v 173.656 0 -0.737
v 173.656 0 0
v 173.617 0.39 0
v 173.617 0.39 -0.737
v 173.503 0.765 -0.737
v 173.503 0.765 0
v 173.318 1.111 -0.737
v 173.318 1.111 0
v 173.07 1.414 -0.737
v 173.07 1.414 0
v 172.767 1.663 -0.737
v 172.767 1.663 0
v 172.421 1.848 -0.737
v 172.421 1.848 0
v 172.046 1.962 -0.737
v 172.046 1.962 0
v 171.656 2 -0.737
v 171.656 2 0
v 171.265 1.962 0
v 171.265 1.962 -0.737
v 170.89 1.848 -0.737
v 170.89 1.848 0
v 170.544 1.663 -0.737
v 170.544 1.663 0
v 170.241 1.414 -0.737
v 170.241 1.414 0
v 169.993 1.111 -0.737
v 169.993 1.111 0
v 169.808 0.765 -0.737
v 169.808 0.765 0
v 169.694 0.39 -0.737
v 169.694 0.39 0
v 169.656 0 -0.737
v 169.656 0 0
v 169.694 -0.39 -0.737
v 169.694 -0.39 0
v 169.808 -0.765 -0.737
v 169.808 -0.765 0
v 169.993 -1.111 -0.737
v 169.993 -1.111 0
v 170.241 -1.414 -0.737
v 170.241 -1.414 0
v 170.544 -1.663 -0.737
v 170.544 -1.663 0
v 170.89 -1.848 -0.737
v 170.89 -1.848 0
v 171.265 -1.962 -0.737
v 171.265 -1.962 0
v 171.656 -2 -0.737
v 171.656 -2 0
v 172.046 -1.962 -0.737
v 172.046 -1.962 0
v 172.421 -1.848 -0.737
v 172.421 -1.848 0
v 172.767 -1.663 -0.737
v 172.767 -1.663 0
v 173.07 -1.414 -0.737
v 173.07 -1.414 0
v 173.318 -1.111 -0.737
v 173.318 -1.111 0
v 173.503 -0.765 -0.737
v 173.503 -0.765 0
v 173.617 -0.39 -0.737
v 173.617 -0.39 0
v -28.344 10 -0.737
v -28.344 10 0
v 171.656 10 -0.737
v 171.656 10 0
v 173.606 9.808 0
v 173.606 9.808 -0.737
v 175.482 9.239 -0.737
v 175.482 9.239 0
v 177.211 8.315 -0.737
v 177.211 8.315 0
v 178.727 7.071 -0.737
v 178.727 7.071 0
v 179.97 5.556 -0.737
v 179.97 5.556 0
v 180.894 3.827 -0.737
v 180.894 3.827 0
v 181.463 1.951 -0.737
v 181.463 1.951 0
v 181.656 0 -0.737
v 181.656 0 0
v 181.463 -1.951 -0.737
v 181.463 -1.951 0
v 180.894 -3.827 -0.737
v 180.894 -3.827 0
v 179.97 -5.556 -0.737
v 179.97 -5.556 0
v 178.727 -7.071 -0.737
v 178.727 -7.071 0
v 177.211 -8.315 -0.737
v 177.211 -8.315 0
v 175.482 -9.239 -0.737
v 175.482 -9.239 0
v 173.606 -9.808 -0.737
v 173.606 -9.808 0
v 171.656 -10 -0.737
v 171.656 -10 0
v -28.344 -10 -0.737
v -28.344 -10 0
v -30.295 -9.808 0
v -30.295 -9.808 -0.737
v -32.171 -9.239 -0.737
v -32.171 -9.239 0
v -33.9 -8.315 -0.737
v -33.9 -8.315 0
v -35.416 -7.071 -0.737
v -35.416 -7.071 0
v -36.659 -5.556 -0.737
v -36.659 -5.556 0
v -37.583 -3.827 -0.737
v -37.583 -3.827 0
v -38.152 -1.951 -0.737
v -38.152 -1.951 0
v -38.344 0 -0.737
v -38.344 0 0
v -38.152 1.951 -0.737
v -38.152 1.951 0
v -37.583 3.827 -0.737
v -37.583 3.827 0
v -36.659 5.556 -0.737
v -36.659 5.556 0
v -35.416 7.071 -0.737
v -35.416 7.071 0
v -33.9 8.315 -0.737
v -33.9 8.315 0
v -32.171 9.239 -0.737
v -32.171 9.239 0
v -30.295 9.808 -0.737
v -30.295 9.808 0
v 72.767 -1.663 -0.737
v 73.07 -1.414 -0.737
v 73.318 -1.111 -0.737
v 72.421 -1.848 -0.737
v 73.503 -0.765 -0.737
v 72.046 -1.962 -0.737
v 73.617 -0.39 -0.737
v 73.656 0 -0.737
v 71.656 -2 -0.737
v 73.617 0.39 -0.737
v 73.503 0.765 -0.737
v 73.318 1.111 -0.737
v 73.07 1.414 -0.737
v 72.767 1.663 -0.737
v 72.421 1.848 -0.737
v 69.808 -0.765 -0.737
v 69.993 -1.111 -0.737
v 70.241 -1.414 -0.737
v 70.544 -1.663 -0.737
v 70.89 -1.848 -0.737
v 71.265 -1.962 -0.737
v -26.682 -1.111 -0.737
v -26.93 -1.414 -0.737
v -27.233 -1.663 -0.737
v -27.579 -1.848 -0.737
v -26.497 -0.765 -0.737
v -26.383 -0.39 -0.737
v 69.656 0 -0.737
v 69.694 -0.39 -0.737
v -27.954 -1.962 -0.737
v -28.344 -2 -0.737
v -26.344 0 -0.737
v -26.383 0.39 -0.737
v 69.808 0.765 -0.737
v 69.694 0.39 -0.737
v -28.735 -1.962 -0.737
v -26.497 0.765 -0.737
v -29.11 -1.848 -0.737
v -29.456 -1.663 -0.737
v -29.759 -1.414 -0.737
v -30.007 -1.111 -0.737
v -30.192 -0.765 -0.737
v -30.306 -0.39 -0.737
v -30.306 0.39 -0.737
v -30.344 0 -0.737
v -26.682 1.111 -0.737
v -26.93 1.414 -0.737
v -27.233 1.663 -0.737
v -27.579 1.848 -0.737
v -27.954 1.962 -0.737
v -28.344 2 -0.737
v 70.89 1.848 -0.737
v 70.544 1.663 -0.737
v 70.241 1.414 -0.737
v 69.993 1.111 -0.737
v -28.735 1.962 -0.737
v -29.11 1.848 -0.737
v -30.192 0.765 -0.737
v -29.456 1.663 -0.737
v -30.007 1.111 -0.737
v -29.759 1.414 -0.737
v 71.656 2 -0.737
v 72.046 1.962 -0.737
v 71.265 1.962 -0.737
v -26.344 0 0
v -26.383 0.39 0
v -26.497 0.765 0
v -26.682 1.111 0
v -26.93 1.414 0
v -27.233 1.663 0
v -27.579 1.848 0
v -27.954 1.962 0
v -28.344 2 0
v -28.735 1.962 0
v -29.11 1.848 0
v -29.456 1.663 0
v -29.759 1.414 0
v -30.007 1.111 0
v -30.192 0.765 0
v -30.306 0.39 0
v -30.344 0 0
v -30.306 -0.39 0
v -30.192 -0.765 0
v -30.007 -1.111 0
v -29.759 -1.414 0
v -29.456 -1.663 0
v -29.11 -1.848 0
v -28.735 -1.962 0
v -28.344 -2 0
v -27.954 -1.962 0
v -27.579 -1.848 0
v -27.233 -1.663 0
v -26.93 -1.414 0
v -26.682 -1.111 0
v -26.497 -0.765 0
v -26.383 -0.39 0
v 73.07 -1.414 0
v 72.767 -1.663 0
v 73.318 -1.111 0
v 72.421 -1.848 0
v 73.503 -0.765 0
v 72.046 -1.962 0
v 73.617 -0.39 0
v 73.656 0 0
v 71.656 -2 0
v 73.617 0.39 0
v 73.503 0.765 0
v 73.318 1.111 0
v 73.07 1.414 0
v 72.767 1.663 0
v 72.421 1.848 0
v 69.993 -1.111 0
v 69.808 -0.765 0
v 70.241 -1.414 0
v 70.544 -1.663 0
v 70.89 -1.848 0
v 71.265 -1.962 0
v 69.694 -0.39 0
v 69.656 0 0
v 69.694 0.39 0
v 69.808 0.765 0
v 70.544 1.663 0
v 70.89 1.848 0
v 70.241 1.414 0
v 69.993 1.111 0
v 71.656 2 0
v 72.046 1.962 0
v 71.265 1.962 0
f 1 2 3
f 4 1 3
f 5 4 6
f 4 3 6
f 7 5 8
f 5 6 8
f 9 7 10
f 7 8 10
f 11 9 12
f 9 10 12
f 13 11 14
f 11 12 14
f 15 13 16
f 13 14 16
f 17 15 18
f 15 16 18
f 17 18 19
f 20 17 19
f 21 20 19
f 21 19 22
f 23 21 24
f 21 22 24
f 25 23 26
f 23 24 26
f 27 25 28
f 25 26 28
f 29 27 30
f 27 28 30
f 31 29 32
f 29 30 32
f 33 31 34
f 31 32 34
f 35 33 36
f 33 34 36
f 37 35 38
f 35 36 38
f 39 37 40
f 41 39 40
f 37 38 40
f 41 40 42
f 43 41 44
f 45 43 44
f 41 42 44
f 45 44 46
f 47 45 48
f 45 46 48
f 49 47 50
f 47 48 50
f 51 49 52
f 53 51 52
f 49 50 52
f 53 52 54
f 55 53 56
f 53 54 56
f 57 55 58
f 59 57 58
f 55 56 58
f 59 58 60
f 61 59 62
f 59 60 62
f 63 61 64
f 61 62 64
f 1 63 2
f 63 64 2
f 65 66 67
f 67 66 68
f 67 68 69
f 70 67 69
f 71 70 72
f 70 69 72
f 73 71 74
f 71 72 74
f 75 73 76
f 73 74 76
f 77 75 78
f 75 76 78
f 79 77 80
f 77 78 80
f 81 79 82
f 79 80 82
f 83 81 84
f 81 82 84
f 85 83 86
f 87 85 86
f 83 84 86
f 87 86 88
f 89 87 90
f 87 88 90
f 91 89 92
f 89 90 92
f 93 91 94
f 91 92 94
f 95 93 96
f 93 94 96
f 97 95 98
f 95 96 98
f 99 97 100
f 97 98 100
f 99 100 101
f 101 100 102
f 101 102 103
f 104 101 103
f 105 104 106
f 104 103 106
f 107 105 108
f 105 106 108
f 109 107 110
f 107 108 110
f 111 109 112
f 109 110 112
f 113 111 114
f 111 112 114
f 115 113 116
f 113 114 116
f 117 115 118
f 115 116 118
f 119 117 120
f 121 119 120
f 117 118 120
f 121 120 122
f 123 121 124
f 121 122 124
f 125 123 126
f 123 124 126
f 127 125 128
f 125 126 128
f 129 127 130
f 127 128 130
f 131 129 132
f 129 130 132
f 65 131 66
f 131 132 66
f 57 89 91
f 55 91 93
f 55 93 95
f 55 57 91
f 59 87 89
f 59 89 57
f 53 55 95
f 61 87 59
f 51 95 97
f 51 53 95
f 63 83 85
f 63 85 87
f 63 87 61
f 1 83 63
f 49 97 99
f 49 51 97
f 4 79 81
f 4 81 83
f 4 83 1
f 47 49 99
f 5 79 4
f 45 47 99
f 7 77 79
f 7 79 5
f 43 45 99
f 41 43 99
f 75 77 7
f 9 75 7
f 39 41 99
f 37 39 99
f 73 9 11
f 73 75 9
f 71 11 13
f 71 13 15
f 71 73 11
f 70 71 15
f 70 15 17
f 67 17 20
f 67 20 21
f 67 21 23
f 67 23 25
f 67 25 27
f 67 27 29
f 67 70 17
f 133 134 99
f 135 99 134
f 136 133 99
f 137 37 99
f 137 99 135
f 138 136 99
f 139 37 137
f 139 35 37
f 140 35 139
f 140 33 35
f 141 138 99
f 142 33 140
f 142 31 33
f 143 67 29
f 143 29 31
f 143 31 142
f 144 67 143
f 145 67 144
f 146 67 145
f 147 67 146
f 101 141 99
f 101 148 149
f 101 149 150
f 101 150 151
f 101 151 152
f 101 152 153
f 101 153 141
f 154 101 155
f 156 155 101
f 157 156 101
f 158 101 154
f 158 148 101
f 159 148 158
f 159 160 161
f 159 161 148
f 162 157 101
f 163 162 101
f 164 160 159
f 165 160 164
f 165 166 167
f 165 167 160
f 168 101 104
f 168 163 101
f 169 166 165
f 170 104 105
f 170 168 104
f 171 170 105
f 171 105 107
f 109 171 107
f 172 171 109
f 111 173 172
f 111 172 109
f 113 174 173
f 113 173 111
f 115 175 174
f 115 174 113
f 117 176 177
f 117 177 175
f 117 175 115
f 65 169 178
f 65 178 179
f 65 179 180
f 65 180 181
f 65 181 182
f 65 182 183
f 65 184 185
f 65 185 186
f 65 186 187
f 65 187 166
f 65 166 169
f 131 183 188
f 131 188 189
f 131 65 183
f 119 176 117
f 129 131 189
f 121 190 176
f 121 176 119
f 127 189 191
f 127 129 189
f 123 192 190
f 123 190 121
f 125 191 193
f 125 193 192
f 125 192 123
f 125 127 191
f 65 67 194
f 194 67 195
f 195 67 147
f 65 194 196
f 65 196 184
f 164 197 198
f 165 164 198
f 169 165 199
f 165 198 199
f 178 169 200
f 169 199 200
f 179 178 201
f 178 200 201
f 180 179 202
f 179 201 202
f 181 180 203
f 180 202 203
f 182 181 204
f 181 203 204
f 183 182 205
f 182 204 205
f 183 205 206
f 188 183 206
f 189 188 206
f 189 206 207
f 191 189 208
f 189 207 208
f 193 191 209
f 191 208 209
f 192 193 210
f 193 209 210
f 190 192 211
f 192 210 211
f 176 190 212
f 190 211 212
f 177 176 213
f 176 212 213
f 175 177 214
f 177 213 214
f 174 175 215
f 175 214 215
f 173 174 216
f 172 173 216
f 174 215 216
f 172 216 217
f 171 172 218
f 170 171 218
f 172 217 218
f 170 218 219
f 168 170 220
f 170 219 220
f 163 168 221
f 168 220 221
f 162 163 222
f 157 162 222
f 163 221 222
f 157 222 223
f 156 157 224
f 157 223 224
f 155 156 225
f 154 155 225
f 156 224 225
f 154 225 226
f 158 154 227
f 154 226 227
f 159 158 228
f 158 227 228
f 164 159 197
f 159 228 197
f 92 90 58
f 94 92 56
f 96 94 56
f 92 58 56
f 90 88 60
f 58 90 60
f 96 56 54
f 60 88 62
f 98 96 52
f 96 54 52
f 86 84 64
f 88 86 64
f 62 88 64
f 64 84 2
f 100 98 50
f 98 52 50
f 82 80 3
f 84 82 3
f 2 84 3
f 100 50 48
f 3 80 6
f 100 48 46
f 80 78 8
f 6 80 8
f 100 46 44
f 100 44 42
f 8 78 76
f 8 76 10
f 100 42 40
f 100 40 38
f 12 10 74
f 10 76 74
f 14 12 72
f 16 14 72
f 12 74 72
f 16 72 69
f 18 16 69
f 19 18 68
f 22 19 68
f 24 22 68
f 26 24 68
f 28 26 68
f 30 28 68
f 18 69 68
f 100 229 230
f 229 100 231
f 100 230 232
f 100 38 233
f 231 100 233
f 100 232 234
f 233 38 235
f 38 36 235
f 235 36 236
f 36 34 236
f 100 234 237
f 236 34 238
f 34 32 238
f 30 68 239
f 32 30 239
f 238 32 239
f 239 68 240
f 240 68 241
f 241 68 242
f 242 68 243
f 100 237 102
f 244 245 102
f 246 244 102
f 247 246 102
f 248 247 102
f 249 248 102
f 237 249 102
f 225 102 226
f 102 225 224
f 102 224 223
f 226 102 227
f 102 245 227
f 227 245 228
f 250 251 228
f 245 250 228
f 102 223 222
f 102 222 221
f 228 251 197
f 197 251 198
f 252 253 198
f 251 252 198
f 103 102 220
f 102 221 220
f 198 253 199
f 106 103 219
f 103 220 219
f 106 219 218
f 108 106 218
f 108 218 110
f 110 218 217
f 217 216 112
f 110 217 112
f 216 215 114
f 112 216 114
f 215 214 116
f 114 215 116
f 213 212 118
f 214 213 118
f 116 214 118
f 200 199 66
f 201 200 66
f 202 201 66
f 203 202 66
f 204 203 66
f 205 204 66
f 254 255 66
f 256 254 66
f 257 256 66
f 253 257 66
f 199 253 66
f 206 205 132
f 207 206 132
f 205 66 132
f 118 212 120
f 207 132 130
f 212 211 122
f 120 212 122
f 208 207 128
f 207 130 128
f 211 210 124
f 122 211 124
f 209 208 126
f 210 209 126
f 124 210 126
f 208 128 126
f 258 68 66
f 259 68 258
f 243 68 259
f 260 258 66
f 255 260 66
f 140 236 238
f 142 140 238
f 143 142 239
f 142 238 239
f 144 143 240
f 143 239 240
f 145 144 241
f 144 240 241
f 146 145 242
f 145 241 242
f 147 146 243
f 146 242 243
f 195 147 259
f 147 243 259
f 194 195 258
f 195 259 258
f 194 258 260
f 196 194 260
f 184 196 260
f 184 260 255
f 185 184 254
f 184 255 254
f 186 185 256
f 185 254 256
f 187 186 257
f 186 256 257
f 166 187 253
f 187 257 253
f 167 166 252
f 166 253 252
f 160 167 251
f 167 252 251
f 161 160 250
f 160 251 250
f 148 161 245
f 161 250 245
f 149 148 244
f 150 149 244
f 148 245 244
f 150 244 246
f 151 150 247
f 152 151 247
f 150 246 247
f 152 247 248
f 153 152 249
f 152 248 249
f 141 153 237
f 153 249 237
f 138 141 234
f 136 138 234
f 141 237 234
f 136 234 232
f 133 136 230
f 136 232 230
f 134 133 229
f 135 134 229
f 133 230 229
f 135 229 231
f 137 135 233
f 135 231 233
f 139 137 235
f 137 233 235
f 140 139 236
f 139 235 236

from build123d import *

# Parameters (mm, degrees)
SKETCH1_R          = 2
BASE_FLANGE1_DEPTH = 0.7366


# Sheet-metal steps are written as plain solids
with BuildPart() as part:
    # Sketch1 → Base-Flange1 (new body)
    with BuildSketch(Plane.XY):
        with BuildLine():
            Line((-28.344481605, 10), (171.655518395, 10))
            ThreePointArc((171.655518395, 10), (181.655518395, 0), (171.655518395, -10))
            Line((171.655518395, -10), (-28.344481605, -10))
            ThreePointArc((-28.344481605, -10), (-38.344481605, 0), (-28.344481605, 10))
        make_face()
        with Locations((-28.344481605, 0)):
            Circle(SKETCH1_R, mode=Mode.SUBTRACT)
        with Locations((171.655518395, 0)):
            Circle(SKETCH1_R, mode=Mode.SUBTRACT)
        with Locations((71.655518395, 0)):
            Circle(SKETCH1_R, mode=Mode.SUBTRACT)
    extrude(amount=-BASE_FLANGE1_DEPTH)


solid = part.part
